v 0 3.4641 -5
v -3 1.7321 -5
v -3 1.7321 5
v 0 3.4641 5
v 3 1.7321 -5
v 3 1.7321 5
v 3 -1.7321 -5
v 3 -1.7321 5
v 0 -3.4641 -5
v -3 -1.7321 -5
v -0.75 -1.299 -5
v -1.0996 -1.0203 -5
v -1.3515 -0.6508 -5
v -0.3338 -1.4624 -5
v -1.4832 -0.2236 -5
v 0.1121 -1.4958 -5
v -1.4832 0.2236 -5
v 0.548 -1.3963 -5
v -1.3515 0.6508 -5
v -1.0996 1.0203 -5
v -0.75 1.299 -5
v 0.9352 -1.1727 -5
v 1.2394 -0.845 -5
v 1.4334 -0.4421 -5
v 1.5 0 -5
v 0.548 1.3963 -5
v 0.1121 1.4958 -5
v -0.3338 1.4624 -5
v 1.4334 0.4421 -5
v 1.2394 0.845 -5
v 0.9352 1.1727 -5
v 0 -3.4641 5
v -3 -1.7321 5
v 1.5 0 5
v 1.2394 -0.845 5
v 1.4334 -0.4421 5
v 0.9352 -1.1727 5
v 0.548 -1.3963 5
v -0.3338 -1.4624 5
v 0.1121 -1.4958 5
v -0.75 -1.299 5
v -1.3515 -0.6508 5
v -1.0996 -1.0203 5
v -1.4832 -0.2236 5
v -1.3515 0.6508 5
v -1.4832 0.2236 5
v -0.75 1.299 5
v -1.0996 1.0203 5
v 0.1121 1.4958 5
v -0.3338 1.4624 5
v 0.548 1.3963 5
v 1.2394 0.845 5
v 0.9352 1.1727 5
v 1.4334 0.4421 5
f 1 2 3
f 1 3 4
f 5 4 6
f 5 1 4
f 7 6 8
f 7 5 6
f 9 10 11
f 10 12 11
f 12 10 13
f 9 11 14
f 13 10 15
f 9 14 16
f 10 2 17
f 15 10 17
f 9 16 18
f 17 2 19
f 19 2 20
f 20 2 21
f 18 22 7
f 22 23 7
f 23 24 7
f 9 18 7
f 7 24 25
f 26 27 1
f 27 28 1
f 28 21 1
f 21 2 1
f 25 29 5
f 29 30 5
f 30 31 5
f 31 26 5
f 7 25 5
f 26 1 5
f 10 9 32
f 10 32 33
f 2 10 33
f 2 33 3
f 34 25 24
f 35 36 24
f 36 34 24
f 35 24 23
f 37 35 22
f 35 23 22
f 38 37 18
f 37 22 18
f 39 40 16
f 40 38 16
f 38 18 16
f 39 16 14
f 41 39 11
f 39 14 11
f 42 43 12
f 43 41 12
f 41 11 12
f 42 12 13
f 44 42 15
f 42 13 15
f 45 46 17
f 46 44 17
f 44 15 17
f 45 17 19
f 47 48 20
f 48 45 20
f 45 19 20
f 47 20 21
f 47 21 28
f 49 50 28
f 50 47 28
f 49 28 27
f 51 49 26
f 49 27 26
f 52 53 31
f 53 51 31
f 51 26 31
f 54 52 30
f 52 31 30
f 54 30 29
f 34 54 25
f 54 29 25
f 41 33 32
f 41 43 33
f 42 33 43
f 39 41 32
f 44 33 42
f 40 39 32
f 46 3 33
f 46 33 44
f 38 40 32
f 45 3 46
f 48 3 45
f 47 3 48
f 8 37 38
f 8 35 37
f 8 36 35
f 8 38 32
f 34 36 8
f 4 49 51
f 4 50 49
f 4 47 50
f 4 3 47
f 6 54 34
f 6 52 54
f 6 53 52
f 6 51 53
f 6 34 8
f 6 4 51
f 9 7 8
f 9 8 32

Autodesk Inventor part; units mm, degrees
ref_plane "YZ Plane" through (0, 0, 0) normal (1, 0, 0) x (0, 1, 0)
ref_plane "XZ Plane" through (0, 0, 0) normal (0, 1, 0) x (-1, 0, 0)
ref_plane "XY Plane" through (0, 0, 0) normal (0, 0, 1) x (1, 0, 0)
sketch "Эскиз1" plane through (0, 0, 0) normal (0, 0, 1) x (1, 0, 0)
  line L0 (0, 3.4641) -> (3, 1.7321)
  line L1 (3, 1.7321) -> (3, -1.7321)
  line L2 (3, -1.7321) -> (0, -3.4641)
  line L3 (0, -3.4641) -> (-3, -1.7321)
  line L4 (-3, -1.7321) -> (-3, 1.7321)
  line L5 (-3, 1.7321) -> (0, 3.4641)
  circle A0 centre (0, 0) radius 1.5
  dimension "d0" = 3
  dimension "d1" = 6
extrude "Выдавливание1" add sketch "Эскиз1" along normal mid plane 10
properties part number "Стойка м3х10"
